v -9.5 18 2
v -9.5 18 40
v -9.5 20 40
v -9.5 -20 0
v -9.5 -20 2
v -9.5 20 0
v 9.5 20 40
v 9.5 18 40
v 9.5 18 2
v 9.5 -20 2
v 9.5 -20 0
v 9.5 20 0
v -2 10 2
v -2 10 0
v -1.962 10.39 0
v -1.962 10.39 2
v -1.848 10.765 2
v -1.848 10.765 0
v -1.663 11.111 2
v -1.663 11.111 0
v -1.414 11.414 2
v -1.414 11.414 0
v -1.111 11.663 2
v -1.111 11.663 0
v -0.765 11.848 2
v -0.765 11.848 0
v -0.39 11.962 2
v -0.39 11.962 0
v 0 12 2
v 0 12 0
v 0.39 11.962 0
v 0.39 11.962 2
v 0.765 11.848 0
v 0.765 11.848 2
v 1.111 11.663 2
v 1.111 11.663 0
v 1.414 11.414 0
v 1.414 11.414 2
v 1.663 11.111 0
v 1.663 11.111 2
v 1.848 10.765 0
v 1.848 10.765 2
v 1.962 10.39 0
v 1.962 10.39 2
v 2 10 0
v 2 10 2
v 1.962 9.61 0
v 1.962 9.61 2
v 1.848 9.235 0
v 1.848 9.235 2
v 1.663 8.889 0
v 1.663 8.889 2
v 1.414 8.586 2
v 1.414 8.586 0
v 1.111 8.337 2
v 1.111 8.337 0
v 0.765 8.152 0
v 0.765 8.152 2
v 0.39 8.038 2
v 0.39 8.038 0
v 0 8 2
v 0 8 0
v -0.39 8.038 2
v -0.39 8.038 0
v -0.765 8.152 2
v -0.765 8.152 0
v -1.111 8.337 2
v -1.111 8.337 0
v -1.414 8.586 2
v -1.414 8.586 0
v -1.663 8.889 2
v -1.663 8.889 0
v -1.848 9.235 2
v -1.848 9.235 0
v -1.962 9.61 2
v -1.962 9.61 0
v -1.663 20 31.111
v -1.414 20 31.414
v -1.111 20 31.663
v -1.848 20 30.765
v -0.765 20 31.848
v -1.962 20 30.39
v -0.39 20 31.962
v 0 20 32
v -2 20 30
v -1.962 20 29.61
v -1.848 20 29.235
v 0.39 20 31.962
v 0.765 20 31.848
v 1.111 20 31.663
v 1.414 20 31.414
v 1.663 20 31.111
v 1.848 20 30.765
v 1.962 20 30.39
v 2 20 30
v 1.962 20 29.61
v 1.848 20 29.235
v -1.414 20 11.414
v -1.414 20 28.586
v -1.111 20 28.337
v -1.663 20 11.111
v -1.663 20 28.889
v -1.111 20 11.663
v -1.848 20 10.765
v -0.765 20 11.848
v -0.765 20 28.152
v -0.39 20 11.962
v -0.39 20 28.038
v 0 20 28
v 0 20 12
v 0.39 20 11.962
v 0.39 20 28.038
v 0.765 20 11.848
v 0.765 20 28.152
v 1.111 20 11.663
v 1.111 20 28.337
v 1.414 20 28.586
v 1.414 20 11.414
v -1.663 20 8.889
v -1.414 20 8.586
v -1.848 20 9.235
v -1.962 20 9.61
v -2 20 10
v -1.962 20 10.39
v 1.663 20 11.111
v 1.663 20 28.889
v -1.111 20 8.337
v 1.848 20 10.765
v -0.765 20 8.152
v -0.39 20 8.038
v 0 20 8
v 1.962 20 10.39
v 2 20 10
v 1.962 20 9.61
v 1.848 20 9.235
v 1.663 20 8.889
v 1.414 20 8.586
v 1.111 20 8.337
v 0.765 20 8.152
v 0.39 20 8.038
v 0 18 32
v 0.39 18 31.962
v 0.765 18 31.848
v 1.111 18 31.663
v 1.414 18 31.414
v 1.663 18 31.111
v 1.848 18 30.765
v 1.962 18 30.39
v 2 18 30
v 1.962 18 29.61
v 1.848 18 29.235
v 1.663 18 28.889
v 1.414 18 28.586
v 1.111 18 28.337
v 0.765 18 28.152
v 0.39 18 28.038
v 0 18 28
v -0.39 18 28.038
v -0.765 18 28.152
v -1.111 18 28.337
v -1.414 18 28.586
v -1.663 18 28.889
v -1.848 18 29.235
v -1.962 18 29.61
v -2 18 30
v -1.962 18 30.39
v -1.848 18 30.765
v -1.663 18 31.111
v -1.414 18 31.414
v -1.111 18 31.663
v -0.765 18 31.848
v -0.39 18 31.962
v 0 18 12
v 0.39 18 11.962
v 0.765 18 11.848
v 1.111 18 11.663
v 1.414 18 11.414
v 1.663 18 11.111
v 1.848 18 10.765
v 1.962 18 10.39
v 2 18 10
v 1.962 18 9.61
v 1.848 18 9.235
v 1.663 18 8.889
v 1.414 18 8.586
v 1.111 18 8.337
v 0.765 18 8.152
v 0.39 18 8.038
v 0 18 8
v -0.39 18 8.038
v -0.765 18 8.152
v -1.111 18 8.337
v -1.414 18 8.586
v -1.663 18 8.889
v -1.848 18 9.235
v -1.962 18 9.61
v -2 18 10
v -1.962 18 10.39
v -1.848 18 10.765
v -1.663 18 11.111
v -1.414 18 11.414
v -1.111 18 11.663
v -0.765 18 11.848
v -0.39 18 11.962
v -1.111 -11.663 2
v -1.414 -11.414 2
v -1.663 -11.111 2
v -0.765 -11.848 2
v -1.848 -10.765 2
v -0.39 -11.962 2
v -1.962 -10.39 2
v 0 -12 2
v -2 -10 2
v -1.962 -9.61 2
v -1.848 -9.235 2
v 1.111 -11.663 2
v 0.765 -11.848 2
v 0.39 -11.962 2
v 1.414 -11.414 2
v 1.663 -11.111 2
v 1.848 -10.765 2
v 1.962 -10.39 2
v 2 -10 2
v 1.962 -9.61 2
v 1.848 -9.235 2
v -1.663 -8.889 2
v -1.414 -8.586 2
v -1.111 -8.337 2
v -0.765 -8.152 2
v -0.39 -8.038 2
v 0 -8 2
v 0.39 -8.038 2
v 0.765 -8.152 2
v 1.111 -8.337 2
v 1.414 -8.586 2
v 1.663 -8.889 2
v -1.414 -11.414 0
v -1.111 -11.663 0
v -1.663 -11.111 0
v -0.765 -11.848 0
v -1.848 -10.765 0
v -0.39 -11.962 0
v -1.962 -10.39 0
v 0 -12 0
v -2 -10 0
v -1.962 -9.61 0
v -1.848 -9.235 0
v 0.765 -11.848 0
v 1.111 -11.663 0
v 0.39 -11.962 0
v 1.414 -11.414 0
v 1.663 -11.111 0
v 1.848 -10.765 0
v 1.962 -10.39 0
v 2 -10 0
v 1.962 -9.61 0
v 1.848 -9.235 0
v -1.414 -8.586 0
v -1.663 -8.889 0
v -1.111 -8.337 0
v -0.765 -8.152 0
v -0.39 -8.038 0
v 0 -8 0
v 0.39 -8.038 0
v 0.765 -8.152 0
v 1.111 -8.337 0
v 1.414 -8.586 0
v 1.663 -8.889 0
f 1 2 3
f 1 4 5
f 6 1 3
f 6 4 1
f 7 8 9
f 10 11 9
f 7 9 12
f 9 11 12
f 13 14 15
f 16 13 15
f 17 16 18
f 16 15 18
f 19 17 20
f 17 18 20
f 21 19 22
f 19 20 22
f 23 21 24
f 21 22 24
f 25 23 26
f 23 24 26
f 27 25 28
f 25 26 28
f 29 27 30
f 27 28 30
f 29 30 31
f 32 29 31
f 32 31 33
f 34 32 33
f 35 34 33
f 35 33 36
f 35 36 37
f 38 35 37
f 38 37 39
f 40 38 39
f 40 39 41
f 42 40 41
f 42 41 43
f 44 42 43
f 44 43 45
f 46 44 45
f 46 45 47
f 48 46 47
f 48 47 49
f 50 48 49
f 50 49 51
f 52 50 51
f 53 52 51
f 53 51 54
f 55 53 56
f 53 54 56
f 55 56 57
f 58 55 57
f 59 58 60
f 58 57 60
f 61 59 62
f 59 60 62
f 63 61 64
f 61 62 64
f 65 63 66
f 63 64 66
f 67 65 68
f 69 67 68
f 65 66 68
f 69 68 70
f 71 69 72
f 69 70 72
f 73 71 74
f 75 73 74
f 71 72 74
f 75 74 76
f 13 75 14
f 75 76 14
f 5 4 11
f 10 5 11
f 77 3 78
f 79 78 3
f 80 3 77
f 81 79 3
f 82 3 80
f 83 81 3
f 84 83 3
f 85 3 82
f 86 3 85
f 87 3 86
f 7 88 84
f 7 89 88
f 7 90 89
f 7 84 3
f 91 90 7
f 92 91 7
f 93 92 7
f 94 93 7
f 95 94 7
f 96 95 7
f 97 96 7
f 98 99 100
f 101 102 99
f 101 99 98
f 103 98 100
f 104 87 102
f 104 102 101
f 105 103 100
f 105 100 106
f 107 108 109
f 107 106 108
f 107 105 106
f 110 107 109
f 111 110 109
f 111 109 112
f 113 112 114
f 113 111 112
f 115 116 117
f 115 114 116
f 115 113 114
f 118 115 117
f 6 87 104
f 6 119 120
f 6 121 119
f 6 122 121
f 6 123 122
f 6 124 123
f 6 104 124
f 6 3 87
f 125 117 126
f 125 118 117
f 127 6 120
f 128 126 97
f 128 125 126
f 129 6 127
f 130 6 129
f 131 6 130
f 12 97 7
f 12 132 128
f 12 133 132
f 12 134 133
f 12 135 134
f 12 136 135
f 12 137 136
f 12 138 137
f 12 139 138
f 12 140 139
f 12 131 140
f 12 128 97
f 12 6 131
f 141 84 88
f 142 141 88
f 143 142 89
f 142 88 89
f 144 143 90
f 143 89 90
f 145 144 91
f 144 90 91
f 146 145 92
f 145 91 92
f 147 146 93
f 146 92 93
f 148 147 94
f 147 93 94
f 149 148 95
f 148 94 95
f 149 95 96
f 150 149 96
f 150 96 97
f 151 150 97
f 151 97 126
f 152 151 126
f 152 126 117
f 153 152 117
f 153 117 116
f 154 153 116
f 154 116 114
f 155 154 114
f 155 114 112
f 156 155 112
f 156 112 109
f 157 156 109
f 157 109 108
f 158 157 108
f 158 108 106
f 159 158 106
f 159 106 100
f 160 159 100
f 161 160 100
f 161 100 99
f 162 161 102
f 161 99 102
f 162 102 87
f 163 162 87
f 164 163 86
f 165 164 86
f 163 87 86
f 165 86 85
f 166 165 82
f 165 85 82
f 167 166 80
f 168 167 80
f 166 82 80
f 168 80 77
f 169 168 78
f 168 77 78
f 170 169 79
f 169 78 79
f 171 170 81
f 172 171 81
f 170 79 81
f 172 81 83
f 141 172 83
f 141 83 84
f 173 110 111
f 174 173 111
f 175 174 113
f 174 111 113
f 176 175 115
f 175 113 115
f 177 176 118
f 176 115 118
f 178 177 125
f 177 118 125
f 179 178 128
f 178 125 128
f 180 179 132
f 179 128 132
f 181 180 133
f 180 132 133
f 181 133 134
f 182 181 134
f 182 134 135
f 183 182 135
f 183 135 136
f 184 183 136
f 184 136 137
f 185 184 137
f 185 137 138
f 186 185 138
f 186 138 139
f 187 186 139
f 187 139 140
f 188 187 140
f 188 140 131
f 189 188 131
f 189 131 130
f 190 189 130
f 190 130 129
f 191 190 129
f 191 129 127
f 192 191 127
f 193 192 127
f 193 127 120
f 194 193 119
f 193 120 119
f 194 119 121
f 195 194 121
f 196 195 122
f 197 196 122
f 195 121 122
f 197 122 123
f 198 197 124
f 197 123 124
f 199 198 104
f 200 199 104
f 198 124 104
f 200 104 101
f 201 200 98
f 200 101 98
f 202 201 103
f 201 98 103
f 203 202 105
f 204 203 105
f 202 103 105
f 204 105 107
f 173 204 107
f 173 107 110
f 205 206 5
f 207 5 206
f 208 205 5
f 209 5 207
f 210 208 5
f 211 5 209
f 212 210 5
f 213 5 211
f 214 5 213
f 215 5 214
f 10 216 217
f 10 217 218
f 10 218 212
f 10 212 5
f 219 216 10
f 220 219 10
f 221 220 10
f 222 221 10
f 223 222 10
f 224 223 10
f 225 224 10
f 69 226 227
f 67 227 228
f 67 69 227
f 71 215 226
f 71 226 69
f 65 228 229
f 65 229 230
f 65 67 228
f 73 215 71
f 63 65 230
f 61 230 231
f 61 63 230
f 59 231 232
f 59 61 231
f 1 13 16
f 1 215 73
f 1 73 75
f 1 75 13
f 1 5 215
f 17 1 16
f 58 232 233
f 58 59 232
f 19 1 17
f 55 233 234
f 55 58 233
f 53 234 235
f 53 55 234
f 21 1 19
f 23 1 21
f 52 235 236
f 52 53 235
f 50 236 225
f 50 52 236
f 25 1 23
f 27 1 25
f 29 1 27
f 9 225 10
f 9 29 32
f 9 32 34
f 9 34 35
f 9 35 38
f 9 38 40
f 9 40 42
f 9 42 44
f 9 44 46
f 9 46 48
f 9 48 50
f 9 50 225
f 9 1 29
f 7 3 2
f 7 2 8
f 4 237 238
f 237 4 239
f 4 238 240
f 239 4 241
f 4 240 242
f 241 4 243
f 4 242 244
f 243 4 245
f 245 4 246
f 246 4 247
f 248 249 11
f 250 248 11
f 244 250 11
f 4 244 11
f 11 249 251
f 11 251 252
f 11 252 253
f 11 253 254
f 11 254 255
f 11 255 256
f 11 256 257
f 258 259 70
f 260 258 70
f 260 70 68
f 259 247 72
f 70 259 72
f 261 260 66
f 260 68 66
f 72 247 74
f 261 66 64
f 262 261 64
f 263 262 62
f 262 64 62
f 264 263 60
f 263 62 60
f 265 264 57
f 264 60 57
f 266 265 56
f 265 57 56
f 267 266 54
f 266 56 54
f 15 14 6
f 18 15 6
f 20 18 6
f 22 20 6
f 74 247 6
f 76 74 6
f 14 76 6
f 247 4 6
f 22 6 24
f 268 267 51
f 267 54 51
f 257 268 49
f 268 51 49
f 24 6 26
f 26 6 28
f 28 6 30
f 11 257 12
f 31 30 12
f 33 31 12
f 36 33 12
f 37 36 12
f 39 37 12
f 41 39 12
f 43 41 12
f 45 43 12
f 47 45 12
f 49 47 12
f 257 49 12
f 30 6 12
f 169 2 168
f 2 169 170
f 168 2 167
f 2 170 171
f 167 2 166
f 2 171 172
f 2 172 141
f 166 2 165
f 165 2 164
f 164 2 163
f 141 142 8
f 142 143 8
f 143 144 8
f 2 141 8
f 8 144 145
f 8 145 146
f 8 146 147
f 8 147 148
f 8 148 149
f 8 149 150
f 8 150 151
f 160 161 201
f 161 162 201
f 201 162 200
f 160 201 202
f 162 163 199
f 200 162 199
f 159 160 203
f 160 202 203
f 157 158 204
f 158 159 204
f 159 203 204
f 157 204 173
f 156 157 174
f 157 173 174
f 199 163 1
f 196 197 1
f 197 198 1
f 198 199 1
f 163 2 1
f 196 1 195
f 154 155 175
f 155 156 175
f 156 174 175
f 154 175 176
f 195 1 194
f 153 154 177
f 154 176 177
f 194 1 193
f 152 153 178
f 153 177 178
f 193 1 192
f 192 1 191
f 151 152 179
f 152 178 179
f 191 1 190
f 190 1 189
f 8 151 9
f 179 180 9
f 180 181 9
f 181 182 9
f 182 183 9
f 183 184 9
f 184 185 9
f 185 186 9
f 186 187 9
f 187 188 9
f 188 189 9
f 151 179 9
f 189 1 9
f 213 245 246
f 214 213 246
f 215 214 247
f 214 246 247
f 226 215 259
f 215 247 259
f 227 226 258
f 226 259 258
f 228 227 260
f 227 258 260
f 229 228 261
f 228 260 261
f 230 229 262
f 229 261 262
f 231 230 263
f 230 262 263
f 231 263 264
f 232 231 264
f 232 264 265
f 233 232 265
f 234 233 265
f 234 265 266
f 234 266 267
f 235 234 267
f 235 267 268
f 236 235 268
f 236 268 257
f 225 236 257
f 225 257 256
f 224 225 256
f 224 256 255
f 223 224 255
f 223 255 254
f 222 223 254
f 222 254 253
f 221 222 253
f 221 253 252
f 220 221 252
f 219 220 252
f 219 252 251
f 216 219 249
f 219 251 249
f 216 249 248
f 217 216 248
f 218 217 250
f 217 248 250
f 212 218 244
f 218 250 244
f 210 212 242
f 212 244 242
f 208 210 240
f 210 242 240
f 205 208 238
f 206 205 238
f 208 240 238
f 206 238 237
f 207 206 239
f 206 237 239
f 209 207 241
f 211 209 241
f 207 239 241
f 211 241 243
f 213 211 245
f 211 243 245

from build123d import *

# Parameters (mm, degrees)
SKETCH1_W           = 19
SKETCH1_H           = 40
BOSS_EXTRUDE1_DEPTH = 2
SKETCH2_W           = 19
SKETCH2_H           = 2
BOSS_EXTRUDE2_DEPTH = 38
SKETCH3_R           = 2
CUT_EXTRUDE1_DEPTH  = 10
SKETCH4_R           = 2
CUT_EXTRUDE2_DEPTH  = 10


with BuildPart() as part:
    # Sketch1 → Boss-Extrude1 (new body)
    with BuildSketch(Plane.XY):
        Rectangle(SKETCH1_W, SKETCH1_H)
    extrude(amount=BOSS_EXTRUDE1_DEPTH)

    # Sketch2 → Boss-Extrude2 (add)
    with BuildSketch(Plane.XY.offset(2)):
        with Locations((0, 19)):
            Rectangle(SKETCH2_W, SKETCH2_H)
    extrude(amount=BOSS_EXTRUDE2_DEPTH)

    # Sketch3 → Cut-Extrude1 (cut)
    with BuildSketch(Plane(origin=(0, 0, 0), x_dir=(-1, 0, 0), z_dir=(0, 0, -1))):
        with Locations((0, 10)):
            Circle(SKETCH3_R)
        with Locations((0, -10)):
            Circle(SKETCH3_R)
    extrude(amount=-CUT_EXTRUDE1_DEPTH, mode=Mode.SUBTRACT)

    # Sketch4 → Cut-Extrude2 (cut)
    with BuildSketch(Plane(origin=(0, 20, 0), x_dir=(1, 0, 0), z_dir=(0, 1, 0))):
        with Locations(Location((0, -10, 0), (0, 0, 270))):
            Circle(SKETCH4_R)
        with Locations(Location((0, -30, 0), (0, 0, 270))):
            Circle(SKETCH4_R)
    extrude(amount=-CUT_EXTRUDE2_DEPTH, mode=Mode.SUBTRACT)


solid = part.part
